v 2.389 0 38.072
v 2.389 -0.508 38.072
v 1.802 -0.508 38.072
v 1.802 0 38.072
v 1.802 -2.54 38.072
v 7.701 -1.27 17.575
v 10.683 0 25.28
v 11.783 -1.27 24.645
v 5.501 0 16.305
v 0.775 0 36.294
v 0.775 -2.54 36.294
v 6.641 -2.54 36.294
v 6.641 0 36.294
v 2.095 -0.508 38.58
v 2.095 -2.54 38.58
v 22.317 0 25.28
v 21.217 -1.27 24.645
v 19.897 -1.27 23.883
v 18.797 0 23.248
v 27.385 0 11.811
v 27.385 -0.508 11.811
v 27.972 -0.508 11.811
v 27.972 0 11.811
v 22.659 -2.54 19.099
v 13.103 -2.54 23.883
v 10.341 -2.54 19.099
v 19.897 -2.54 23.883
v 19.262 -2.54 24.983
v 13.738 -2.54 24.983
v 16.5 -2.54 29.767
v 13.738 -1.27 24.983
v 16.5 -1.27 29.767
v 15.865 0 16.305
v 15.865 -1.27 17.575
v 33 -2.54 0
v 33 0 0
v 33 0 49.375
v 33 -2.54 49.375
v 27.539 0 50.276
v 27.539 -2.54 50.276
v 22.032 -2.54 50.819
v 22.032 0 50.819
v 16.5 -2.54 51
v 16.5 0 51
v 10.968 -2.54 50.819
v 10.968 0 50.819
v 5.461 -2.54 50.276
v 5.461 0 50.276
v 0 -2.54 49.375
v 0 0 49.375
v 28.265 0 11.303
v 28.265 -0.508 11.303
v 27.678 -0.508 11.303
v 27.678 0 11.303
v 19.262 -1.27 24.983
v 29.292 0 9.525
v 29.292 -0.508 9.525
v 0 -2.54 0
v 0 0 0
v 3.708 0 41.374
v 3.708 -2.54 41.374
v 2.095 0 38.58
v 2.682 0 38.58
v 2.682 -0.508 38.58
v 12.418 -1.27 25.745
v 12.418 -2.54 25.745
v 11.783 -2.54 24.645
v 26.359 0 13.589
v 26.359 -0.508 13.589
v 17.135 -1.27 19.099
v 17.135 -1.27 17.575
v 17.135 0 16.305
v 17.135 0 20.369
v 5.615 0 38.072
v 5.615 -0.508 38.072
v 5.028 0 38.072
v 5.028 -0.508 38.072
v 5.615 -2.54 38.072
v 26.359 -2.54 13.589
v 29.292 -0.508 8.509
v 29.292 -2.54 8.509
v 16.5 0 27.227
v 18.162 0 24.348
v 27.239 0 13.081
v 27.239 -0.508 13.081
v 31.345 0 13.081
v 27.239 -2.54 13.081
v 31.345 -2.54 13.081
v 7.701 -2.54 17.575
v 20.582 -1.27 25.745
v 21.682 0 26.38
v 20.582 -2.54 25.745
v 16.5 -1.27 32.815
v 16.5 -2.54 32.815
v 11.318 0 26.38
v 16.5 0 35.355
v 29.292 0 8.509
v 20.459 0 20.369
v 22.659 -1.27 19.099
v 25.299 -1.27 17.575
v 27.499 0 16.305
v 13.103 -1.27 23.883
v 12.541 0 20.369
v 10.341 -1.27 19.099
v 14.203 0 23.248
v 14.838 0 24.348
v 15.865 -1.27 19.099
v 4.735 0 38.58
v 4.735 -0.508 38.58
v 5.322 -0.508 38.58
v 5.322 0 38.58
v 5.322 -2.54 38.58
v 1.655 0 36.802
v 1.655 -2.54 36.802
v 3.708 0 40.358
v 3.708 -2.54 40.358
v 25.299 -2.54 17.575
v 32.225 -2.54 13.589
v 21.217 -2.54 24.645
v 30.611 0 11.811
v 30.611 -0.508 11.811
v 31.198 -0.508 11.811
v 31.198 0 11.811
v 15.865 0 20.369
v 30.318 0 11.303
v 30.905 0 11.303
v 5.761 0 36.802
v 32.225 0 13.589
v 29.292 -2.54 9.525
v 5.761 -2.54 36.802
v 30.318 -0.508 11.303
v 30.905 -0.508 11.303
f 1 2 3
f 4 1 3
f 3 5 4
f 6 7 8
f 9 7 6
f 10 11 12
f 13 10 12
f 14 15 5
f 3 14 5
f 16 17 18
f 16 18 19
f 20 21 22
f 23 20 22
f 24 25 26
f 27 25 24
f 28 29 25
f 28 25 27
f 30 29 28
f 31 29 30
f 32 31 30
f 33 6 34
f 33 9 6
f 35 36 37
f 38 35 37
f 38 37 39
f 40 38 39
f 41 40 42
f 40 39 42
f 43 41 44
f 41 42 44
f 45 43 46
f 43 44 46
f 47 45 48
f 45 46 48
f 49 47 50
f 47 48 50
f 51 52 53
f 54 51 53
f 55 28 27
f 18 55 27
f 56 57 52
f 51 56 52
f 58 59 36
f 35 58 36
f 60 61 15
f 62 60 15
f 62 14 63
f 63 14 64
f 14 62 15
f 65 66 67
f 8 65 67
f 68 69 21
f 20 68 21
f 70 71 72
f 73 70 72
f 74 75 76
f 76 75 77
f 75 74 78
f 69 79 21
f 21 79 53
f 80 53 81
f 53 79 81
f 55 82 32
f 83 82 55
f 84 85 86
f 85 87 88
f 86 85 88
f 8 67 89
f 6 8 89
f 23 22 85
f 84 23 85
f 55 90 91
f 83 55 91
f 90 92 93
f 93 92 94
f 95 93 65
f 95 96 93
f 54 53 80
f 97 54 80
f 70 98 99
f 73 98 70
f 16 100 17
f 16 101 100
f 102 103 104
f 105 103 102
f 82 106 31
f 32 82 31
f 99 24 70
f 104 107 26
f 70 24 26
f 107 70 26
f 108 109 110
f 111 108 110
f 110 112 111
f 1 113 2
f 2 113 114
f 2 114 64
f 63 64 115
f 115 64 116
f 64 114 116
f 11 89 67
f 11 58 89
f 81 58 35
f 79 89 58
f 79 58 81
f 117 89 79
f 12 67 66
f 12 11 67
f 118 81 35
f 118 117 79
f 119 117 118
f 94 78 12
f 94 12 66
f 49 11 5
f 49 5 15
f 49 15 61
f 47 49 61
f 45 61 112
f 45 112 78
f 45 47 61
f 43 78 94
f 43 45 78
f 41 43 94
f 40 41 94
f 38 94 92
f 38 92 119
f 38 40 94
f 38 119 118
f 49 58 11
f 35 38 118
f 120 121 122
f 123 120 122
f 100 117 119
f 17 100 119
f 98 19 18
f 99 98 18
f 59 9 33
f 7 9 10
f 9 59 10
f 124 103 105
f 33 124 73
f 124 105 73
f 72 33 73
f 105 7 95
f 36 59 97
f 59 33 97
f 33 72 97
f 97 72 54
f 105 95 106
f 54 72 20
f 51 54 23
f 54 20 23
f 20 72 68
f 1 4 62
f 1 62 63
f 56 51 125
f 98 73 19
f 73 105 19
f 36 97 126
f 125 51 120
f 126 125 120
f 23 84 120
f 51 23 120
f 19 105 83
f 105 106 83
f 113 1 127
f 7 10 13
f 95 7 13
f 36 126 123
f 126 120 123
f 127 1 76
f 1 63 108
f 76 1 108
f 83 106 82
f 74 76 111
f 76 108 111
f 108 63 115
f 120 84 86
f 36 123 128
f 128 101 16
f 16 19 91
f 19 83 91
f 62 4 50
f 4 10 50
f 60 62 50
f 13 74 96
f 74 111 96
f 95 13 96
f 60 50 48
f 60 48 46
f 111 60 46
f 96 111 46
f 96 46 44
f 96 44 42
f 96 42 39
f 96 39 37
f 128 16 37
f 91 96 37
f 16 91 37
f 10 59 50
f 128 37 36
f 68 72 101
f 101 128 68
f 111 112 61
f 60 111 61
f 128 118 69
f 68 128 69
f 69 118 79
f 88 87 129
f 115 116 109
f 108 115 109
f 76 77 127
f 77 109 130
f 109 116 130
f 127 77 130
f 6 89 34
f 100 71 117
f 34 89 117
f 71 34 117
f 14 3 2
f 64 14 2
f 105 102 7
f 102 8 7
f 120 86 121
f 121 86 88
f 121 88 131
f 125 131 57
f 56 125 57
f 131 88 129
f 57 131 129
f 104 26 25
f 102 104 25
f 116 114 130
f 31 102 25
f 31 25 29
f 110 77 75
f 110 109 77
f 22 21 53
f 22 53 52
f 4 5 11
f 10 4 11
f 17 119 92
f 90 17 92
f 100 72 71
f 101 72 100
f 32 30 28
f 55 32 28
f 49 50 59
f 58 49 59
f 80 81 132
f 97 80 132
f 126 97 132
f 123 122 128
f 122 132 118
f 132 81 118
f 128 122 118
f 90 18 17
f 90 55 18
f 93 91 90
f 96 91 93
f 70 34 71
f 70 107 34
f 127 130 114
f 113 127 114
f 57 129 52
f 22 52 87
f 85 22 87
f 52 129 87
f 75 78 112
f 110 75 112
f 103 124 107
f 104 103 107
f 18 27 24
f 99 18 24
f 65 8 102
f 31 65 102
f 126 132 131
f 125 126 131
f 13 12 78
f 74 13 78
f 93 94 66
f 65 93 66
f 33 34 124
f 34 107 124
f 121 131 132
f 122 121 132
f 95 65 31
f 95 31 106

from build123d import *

# Parameters (mm, degrees)
F1_DEPTH = 2.54
F3_DEPTH = 25.4
F5_DEPTH = 2.032
F7_DEPTH = 1.27
F8_SIZE  = 1.27


with BuildPart() as f1:
    # F0 (on Front) → F1 (new body)
    with BuildSketch(Plane.XZ):
        with BuildLine():
            ThreePointArc((33.00001, 49.374628), (16.500005, 51.000006), (0, 49.374628))
            Line((0, 49.374628), (0, 0))
            Line((0, 0), (33.00001, 0))
            Line((33.00001, 0), (33.00001, 49.374628))
        make_face()
    extrude(amount=F1_DEPTH)

    # F2 (on face) → F3 (cut)
    with BuildSketch(Plane.XZ.offset(2.54)):
        Polygon((20.581914, 25.74524), (16.500005, 32.815314), (12.418096, 25.74524), (13.737919, 24.98324), (16.500005, 29.767314), (19.262091, 24.98324), align=None)
        Polygon((11.783096, 24.645388), (7.701187, 17.575314), (15.865005, 17.575314), (15.865005, 19.099314), (10.340832, 19.099314), (13.102919, 23.883388), align=None)
        Polygon((17.135005, 17.575314), (25.298823, 17.575314), (21.216914, 24.645388), (19.897091, 23.883388), (22.659178, 19.099314), (17.135005, 19.099314), align=None)
        Polygon((32.22455, 13.589), (26.358671, 13.589), (27.3852, 11.811), (27.971787, 11.811), (27.238553, 13.081), (29.29161, 13.081), (31.344668, 13.081), (30.611433, 11.811), (31.198021, 11.811), align=None)
        Polygon((27.678494, 11.303), (29.29161, 8.509), (30.904727, 11.303), (30.318139, 11.303), (29.29161, 9.525), (28.265081, 11.303), align=None)
        Polygon((1.801989, 38.071628), (0.775461, 36.293628), (6.641339, 36.293628), (5.614811, 38.071628), (5.028223, 38.071628), (5.761458, 36.801628), (1.655342, 36.801628), (2.388577, 38.071628), align=None)
        Polygon((5.321517, 38.579628), (3.7084, 41.373628), (2.095283, 38.579628), (2.681871, 38.579628), (3.7084, 40.357628), (4.734929, 38.579628), align=None)
    extrude(amount=-F3_DEPTH, mode=Mode.SUBTRACT)

    # F4 (on face) → F5 (cut)
    with BuildSketch(Plane.XZ.offset(2.54)):
        Polygon((6.641339, 36.293628), (3.7084, 41.373628), (0.775461, 36.293628), align=None)
        Polygon((1.655342, 36.801628), (3.7084, 40.357628), (5.761458, 36.801628), align=None, mode=Mode.SUBTRACT)
        Polygon((32.22455, 13.589), (26.358671, 13.589), (29.29161, 8.509), align=None)
        Polygon((29.29161, 9.525), (27.238553, 13.081), (31.344668, 13.081), align=None, mode=Mode.SUBTRACT)
    extrude(amount=-F5_DEPTH, mode=Mode.SUBTRACT)

    # F6 (on face) → F7 (cut)
    with BuildSketch(Plane.XZ.offset(2.54)):
        Polygon((25.298823, 17.575314), (16.500005, 32.815314), (7.701187, 17.575314), align=None)
        Polygon((10.340832, 19.099314), (16.500005, 29.767314), (22.659178, 19.099314), align=None, mode=Mode.SUBTRACT)
    extrude(amount=-F7_DEPTH, mode=Mode.SUBTRACT)

    # F8
    f8_edges = [f1.edges().sort_by_distance(p)[0] for p in [
        (23.257869, 0, 21.110351),
        (18.54096, 0, 29.280277),
        (9.742142, 0, 21.110351),
        (14.459051, 0, 29.280277),
        (11.783096, 0, 17.575314),
        (21.216914, 0, 17.575314),
        (21.278135, 0, 21.491351),
        (17.881048, 0, 27.375277),
        (13.102919, 0, 19.099314),
        (19.897091, 0, 19.099314),
        (11.721876, 0, 21.491351),
        (15.118962, 0, 27.375277),
    ]]
    chamfer(f8_edges, length=F8_SIZE)


solid = f1.part
